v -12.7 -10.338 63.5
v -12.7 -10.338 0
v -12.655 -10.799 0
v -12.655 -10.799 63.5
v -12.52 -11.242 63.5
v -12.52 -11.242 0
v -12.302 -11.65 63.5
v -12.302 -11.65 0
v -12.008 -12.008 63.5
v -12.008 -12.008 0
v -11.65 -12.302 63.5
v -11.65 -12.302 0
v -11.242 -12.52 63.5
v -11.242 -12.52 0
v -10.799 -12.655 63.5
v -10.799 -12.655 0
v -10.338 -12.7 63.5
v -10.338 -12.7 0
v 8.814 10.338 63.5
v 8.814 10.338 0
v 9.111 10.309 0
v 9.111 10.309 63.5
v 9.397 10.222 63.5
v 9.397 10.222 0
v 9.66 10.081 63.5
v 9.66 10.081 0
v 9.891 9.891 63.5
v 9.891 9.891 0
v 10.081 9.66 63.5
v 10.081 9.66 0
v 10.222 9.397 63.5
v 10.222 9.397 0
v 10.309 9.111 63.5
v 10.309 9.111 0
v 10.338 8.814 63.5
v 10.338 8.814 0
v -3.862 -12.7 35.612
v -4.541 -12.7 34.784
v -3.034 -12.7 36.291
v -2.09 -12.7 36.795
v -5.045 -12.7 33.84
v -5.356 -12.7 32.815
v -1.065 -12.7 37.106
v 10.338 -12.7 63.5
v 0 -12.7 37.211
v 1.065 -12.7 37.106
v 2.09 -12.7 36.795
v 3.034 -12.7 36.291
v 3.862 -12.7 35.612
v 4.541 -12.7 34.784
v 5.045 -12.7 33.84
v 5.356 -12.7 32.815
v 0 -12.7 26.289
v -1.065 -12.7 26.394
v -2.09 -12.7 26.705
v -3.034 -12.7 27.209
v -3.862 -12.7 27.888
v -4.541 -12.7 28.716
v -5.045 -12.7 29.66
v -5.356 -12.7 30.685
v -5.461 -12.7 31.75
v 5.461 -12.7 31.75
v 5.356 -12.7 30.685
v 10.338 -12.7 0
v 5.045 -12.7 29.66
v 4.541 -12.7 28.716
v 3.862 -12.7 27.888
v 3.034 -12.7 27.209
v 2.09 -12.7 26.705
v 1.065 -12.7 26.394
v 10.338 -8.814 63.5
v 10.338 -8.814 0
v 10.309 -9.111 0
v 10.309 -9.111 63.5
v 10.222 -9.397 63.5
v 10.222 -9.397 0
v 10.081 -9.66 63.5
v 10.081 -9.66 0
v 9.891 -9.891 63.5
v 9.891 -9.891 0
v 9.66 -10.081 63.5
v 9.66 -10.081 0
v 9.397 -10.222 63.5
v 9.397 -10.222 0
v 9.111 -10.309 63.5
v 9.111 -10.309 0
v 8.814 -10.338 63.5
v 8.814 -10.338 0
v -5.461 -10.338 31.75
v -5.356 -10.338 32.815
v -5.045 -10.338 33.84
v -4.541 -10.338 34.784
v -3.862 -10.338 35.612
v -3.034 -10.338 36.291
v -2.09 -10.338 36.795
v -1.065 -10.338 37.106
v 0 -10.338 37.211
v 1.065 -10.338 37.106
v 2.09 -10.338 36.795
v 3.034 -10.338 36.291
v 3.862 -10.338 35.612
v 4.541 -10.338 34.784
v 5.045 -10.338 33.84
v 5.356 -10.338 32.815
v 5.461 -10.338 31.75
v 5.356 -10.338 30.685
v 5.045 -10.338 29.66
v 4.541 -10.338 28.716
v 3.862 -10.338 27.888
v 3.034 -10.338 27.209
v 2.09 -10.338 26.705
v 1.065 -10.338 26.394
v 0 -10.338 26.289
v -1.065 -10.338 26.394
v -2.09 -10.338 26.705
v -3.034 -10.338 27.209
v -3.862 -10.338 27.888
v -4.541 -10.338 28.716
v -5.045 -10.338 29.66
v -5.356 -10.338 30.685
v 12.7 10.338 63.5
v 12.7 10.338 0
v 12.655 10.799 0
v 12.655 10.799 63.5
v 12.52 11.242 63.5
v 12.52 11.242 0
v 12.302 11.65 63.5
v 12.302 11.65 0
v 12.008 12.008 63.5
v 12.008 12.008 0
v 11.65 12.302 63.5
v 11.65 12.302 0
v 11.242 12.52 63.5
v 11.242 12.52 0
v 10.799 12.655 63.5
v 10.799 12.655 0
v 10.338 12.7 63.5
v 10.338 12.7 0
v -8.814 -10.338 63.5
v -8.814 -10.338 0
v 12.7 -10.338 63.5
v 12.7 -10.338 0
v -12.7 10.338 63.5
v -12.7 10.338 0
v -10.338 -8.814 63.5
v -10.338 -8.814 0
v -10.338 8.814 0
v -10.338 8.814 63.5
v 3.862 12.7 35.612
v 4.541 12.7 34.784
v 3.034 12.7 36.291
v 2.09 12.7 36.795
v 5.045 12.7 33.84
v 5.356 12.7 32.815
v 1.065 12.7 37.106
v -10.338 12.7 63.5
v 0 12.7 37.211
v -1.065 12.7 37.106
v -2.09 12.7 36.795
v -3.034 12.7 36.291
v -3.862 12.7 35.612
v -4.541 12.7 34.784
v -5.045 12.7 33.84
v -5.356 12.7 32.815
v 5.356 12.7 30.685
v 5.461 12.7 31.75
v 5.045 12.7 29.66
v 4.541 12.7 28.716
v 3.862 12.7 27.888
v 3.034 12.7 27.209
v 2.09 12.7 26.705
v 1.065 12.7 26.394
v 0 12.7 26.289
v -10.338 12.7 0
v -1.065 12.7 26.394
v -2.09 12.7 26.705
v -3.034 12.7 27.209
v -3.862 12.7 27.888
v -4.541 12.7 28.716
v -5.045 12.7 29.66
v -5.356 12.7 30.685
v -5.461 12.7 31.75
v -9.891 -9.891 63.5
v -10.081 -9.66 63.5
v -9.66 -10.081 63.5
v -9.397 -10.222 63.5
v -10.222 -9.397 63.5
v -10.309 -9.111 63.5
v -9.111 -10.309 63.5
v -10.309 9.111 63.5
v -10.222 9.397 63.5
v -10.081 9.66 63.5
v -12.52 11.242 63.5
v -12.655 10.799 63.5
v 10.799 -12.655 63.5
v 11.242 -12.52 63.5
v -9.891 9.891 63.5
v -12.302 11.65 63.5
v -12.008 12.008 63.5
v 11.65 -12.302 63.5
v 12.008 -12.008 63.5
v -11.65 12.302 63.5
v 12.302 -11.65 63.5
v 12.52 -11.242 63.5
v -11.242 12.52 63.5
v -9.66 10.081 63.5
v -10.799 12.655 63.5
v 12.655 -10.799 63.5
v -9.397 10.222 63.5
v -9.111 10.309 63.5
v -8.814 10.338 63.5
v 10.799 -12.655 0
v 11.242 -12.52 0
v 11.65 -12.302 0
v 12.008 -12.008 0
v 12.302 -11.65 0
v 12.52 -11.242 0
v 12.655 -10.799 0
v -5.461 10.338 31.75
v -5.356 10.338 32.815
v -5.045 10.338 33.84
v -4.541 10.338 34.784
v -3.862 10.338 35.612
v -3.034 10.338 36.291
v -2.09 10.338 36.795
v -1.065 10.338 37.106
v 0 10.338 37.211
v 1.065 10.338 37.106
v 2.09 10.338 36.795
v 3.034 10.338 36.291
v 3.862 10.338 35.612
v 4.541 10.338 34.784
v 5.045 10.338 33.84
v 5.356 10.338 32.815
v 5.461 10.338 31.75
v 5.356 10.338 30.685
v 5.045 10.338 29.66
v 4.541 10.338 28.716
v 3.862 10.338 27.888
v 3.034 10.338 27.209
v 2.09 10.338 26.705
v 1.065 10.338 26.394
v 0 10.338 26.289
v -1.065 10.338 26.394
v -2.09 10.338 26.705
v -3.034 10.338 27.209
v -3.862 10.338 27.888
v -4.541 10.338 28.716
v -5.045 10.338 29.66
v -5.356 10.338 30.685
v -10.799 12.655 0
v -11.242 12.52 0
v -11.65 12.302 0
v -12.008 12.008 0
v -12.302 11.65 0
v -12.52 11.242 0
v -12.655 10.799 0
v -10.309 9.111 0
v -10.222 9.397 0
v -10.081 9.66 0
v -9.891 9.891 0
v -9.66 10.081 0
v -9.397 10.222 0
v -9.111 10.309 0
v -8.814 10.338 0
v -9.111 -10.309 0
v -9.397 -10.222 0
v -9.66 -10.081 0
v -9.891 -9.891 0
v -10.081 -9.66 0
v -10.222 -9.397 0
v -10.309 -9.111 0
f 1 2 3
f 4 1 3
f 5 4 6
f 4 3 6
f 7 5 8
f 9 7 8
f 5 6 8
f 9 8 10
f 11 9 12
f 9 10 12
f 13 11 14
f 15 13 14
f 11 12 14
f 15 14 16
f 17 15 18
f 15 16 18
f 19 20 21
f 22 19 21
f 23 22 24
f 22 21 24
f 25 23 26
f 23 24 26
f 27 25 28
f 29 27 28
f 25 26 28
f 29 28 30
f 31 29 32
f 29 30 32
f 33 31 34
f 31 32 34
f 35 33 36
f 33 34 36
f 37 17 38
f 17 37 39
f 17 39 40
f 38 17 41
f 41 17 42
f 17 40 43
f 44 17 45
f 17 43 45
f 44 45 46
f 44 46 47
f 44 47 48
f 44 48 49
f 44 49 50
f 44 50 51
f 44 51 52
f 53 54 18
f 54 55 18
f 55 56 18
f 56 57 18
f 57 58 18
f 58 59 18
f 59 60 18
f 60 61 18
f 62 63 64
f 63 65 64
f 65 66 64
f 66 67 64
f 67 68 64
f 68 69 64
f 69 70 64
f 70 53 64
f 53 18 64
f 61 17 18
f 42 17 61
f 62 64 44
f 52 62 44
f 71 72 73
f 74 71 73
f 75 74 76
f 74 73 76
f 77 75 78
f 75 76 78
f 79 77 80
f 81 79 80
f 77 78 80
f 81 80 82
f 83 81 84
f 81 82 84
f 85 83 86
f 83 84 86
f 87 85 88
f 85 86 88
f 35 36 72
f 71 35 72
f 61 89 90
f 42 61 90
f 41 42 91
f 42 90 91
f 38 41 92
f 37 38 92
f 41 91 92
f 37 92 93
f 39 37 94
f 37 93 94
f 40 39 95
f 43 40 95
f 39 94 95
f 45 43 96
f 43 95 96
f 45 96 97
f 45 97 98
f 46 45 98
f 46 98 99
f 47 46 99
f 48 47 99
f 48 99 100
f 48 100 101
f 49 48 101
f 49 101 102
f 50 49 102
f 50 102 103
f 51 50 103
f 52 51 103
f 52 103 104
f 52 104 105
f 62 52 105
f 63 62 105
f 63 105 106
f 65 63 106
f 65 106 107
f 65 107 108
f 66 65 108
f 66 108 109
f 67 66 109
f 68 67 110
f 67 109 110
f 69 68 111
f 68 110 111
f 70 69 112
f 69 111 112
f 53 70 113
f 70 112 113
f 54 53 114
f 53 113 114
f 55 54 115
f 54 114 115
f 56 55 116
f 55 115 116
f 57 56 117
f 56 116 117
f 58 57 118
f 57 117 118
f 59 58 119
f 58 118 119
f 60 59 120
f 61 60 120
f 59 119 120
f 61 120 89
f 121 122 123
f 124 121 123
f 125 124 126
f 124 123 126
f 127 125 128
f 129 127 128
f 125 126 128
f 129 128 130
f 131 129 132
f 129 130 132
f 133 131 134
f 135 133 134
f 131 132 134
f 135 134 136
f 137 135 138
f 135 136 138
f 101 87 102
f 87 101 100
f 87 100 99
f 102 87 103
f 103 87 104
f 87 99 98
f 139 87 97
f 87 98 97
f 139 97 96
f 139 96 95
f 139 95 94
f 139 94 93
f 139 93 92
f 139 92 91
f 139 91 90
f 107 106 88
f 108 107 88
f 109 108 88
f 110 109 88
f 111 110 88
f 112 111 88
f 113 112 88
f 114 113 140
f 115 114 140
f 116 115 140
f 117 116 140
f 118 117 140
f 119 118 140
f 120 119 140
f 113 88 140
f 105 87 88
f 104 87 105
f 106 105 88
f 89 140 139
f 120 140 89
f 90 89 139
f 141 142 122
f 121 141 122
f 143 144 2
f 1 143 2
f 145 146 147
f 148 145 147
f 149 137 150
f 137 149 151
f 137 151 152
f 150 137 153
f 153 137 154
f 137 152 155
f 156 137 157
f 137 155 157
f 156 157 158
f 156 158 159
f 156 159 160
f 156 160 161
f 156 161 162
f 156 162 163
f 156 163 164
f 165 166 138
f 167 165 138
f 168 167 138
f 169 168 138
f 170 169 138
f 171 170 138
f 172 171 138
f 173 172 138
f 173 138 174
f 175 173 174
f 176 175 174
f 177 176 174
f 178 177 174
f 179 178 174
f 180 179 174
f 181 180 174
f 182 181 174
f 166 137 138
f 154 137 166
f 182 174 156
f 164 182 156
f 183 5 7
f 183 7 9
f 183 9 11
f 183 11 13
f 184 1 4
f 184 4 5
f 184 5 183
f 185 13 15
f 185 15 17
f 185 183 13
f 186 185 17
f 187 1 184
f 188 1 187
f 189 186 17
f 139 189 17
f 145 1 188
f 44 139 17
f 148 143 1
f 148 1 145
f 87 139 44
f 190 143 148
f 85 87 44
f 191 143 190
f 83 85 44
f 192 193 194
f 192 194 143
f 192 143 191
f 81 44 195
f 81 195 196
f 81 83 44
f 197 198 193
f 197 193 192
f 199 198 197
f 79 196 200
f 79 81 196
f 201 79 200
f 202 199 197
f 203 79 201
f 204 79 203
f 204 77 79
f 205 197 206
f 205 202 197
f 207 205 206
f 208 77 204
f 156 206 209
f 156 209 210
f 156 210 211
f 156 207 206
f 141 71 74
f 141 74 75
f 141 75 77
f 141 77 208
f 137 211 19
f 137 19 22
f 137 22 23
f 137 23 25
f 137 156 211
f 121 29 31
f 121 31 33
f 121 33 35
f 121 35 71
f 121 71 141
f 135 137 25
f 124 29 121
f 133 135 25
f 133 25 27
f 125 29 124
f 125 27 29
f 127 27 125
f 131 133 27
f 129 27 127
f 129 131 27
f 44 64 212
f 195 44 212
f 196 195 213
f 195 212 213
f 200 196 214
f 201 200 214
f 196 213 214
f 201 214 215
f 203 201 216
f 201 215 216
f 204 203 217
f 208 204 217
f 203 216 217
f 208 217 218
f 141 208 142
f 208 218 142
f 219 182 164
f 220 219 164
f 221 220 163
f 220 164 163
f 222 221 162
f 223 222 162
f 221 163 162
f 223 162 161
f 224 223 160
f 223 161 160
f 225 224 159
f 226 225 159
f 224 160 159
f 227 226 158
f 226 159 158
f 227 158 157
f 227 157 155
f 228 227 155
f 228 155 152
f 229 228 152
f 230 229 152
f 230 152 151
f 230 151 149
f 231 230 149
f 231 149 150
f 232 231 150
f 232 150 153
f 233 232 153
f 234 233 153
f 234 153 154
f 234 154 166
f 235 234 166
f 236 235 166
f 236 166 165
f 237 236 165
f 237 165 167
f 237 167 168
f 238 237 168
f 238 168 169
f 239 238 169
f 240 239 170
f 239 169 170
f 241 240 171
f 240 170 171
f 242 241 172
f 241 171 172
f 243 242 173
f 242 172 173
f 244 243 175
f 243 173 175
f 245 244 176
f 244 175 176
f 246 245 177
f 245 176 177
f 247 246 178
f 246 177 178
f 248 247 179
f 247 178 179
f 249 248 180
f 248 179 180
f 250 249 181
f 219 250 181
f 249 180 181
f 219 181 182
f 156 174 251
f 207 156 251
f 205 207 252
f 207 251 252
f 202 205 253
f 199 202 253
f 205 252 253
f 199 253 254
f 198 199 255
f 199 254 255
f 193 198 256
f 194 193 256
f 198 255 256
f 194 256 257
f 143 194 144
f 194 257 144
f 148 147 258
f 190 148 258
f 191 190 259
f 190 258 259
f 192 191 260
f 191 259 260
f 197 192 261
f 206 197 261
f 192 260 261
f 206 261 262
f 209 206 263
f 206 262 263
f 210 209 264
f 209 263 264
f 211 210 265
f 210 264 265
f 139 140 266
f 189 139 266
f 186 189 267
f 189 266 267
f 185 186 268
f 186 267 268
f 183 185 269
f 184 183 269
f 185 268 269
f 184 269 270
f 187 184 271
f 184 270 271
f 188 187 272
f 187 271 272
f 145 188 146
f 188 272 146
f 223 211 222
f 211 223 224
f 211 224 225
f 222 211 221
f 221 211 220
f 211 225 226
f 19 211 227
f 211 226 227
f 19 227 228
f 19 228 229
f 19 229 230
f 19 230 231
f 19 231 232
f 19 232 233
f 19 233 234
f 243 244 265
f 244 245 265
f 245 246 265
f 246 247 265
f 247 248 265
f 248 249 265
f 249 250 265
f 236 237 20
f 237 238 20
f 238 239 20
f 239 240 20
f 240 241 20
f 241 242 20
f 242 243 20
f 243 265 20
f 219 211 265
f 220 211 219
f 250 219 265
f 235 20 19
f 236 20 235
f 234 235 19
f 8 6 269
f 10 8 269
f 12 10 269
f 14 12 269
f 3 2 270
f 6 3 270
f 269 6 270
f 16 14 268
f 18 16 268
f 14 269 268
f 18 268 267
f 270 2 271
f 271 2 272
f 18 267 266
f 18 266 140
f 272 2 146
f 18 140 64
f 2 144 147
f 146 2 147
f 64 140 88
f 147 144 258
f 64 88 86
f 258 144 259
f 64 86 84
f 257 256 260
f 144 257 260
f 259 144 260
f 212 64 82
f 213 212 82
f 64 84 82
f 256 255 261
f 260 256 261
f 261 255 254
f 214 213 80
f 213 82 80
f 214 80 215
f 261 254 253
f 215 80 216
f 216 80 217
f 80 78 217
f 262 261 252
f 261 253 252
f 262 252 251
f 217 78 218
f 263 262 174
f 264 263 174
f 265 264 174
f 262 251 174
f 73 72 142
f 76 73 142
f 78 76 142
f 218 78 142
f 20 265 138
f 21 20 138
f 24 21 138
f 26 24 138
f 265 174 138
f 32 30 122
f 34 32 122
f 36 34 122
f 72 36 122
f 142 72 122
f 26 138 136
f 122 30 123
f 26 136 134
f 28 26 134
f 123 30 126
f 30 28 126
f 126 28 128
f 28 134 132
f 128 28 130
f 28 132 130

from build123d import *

# Parameters (mm, degrees)
F1_DEPTH = 63.5
F3_D     = 10.922


with BuildPart() as f1:
    # F0 (on Top) → F1 (new body)
    with BuildSketch(Plane.XY):
        with BuildLine():
            ThreePointArc((-10.3378, 12.7), (-12.008128, 12.008128), (-12.7, 10.3378))
            Line((-12.7, 10.3378), (-12.7, -10.3378))
            ThreePointArc((-12.7, -10.3378), (-12.008128, -12.008128), (-10.3378, -12.7))
            Line((-10.3378, -12.7), (10.3378, -12.7))
            ThreePointArc((10.3378, -12.7), (12.008128, -12.008128), (12.7, -10.3378))
            Line((12.7, -10.3378), (12.7, 10.3378))
            ThreePointArc((12.7, 10.3378), (12.008128, 12.008128), (10.3378, 12.7))
            Line((10.3378, 12.7), (-10.3378, 12.7))
        make_face()
        with BuildLine():
            Line((-8.8138, 10.3378), (8.8138, 10.3378))
            ThreePointArc((8.8138, 10.3378), (9.891431, 9.891431), (10.3378, 8.8138))
            Line((10.3378, 8.8138), (10.3378, -8.8138))
            ThreePointArc((10.3378, -8.8138), (9.891431, -9.891431), (8.8138, -10.3378))
            Line((8.8138, -10.3378), (-8.8138, -10.3378))
            ThreePointArc((-8.8138, -10.3378), (-9.891431, -9.891431), (-10.3378, -8.8138))
            Line((-10.3378, -8.8138), (-10.3378, 8.8138))
            ThreePointArc((-10.3378, 8.8138), (-9.891431, 9.891431), (-8.8138, 10.3378))
        make_face(mode=Mode.SUBTRACT)
    extrude(amount=F1_DEPTH)

    # F3 (through all)
    with Locations(Plane.XZ.offset(12.7)):
        with Locations((0, 31.75)):
            Hole(F3_D / 2)


solid = f1.part
